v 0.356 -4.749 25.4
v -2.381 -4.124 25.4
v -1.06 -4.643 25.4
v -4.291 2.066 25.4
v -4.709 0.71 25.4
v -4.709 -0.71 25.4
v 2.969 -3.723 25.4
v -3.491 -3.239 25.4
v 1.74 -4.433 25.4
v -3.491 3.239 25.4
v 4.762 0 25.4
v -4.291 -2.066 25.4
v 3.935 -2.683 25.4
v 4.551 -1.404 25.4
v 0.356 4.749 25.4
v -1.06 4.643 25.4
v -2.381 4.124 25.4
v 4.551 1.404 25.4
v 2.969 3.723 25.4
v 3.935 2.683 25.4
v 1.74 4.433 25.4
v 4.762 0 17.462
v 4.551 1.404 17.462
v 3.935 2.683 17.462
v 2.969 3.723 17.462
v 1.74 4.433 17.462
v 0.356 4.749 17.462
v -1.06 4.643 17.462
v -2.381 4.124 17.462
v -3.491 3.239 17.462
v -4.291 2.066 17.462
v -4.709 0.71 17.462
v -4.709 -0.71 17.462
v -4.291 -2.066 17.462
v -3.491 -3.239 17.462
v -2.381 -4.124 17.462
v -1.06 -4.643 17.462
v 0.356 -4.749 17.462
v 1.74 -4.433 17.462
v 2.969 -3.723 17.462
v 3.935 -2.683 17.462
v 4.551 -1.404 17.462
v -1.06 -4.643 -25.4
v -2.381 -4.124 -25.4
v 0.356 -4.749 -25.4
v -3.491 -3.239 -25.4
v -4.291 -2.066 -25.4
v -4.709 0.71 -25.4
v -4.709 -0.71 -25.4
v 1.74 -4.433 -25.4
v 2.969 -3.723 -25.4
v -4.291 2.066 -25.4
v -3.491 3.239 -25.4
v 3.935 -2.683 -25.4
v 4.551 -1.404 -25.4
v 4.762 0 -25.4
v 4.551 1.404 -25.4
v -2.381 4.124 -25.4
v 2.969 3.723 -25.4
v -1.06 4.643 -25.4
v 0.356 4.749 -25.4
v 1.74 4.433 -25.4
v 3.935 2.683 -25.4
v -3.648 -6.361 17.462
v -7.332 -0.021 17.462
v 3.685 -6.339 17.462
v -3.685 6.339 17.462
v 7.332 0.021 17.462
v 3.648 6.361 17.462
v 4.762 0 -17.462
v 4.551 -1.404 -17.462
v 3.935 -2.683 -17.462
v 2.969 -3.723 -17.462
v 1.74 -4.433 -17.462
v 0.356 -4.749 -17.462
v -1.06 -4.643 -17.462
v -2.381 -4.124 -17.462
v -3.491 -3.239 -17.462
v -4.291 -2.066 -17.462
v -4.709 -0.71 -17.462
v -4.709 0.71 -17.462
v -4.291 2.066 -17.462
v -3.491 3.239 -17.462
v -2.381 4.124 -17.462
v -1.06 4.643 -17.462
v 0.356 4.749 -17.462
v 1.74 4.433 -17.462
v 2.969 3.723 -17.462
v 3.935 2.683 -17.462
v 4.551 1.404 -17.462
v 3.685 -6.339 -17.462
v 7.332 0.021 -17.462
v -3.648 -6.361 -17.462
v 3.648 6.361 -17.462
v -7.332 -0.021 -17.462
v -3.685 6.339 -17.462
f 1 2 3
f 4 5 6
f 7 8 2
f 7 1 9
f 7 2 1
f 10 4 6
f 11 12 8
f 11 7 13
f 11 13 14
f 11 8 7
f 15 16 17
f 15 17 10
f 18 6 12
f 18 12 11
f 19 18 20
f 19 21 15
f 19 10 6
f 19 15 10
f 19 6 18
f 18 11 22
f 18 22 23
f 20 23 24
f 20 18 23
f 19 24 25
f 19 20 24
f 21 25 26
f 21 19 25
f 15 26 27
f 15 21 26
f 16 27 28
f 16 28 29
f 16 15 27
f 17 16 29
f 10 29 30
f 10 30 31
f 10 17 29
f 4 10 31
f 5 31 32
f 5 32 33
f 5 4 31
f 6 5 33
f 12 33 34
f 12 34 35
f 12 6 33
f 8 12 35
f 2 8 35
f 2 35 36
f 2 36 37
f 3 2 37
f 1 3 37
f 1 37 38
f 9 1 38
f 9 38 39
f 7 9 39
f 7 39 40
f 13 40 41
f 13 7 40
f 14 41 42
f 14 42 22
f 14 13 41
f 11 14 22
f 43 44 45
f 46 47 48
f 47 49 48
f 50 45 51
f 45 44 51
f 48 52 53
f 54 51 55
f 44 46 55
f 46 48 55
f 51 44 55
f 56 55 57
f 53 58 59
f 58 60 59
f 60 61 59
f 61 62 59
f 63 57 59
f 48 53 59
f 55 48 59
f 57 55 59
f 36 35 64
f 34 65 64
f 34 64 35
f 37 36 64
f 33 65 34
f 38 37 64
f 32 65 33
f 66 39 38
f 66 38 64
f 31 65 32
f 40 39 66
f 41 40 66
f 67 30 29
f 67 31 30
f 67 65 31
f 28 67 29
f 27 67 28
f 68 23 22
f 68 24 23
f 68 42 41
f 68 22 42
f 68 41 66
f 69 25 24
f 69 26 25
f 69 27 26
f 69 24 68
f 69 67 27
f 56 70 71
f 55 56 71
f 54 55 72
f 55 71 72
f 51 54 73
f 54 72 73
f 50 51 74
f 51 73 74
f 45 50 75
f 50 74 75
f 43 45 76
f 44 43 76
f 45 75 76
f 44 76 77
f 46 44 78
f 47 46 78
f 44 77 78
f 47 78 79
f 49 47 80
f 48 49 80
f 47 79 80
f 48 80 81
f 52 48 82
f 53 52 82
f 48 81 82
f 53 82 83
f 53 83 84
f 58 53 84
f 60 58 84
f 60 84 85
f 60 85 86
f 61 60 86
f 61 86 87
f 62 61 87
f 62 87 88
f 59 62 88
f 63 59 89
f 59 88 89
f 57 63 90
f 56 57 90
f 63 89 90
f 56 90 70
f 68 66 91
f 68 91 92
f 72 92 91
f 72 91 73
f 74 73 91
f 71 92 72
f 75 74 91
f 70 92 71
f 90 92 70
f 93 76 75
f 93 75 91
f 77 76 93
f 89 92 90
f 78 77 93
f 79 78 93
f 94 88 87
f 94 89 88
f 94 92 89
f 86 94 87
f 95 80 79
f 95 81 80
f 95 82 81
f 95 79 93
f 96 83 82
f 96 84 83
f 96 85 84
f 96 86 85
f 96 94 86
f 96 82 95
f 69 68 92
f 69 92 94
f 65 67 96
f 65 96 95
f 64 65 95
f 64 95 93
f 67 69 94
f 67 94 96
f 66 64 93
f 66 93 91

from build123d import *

# Parameters (mm, degrees)
BOSS_EXTRUDE1_DEPTH = 25.4
SKETCH2_R           = 7.332348419
SKETCH2_R_2         = 4.7625
CUT_EXTRUDE1_DEPTH  = 7.9375
CUT_EXTRUDE2_START  = -7.9375
SKETCH3_R           = 7.332348419
SKETCH3_R_2         = 4.7625
CUT_EXTRUDE2_DEPTH  = 7.9375


with BuildPart() as part:
    # Sketch1 → Boss-Extrude1 (new, symmetric)
    with BuildSketch(Plane.XY):
        Polygon((3.684589596, -6.339332208), (7.332317533, 0.021282089), (3.647727937, 6.360614297), (-3.684589596, 6.339332208), (-7.332317533, -0.021282089), (-3.647727937, -6.360614297), align=None)
    extrude(amount=BOSS_EXTRUDE1_DEPTH, both=True)

    # Sketch2 → Cut-Extrude1 (cut)
    with BuildSketch(Plane.XY.offset(25.4)):
        Circle(SKETCH2_R)
        Circle(SKETCH2_R_2, mode=Mode.SUBTRACT)
    extrude(amount=-CUT_EXTRUDE1_DEPTH, mode=Mode.SUBTRACT)

    # Sketch3 → Cut-Extrude2 (cut)
    with BuildSketch(Plane(origin=(0, 0, -25.4), x_dir=(-1, 0, 0), z_dir=(0, 0, -1)).offset(CUT_EXTRUDE2_START)):
        Circle(SKETCH3_R)
        with Locations(Location((0, 0, 0), (0, 0, 180))):
            Circle(SKETCH3_R_2, mode=Mode.SUBTRACT)
    extrude(amount=CUT_EXTRUDE2_DEPTH, mode=Mode.SUBTRACT)


solid = part.part
